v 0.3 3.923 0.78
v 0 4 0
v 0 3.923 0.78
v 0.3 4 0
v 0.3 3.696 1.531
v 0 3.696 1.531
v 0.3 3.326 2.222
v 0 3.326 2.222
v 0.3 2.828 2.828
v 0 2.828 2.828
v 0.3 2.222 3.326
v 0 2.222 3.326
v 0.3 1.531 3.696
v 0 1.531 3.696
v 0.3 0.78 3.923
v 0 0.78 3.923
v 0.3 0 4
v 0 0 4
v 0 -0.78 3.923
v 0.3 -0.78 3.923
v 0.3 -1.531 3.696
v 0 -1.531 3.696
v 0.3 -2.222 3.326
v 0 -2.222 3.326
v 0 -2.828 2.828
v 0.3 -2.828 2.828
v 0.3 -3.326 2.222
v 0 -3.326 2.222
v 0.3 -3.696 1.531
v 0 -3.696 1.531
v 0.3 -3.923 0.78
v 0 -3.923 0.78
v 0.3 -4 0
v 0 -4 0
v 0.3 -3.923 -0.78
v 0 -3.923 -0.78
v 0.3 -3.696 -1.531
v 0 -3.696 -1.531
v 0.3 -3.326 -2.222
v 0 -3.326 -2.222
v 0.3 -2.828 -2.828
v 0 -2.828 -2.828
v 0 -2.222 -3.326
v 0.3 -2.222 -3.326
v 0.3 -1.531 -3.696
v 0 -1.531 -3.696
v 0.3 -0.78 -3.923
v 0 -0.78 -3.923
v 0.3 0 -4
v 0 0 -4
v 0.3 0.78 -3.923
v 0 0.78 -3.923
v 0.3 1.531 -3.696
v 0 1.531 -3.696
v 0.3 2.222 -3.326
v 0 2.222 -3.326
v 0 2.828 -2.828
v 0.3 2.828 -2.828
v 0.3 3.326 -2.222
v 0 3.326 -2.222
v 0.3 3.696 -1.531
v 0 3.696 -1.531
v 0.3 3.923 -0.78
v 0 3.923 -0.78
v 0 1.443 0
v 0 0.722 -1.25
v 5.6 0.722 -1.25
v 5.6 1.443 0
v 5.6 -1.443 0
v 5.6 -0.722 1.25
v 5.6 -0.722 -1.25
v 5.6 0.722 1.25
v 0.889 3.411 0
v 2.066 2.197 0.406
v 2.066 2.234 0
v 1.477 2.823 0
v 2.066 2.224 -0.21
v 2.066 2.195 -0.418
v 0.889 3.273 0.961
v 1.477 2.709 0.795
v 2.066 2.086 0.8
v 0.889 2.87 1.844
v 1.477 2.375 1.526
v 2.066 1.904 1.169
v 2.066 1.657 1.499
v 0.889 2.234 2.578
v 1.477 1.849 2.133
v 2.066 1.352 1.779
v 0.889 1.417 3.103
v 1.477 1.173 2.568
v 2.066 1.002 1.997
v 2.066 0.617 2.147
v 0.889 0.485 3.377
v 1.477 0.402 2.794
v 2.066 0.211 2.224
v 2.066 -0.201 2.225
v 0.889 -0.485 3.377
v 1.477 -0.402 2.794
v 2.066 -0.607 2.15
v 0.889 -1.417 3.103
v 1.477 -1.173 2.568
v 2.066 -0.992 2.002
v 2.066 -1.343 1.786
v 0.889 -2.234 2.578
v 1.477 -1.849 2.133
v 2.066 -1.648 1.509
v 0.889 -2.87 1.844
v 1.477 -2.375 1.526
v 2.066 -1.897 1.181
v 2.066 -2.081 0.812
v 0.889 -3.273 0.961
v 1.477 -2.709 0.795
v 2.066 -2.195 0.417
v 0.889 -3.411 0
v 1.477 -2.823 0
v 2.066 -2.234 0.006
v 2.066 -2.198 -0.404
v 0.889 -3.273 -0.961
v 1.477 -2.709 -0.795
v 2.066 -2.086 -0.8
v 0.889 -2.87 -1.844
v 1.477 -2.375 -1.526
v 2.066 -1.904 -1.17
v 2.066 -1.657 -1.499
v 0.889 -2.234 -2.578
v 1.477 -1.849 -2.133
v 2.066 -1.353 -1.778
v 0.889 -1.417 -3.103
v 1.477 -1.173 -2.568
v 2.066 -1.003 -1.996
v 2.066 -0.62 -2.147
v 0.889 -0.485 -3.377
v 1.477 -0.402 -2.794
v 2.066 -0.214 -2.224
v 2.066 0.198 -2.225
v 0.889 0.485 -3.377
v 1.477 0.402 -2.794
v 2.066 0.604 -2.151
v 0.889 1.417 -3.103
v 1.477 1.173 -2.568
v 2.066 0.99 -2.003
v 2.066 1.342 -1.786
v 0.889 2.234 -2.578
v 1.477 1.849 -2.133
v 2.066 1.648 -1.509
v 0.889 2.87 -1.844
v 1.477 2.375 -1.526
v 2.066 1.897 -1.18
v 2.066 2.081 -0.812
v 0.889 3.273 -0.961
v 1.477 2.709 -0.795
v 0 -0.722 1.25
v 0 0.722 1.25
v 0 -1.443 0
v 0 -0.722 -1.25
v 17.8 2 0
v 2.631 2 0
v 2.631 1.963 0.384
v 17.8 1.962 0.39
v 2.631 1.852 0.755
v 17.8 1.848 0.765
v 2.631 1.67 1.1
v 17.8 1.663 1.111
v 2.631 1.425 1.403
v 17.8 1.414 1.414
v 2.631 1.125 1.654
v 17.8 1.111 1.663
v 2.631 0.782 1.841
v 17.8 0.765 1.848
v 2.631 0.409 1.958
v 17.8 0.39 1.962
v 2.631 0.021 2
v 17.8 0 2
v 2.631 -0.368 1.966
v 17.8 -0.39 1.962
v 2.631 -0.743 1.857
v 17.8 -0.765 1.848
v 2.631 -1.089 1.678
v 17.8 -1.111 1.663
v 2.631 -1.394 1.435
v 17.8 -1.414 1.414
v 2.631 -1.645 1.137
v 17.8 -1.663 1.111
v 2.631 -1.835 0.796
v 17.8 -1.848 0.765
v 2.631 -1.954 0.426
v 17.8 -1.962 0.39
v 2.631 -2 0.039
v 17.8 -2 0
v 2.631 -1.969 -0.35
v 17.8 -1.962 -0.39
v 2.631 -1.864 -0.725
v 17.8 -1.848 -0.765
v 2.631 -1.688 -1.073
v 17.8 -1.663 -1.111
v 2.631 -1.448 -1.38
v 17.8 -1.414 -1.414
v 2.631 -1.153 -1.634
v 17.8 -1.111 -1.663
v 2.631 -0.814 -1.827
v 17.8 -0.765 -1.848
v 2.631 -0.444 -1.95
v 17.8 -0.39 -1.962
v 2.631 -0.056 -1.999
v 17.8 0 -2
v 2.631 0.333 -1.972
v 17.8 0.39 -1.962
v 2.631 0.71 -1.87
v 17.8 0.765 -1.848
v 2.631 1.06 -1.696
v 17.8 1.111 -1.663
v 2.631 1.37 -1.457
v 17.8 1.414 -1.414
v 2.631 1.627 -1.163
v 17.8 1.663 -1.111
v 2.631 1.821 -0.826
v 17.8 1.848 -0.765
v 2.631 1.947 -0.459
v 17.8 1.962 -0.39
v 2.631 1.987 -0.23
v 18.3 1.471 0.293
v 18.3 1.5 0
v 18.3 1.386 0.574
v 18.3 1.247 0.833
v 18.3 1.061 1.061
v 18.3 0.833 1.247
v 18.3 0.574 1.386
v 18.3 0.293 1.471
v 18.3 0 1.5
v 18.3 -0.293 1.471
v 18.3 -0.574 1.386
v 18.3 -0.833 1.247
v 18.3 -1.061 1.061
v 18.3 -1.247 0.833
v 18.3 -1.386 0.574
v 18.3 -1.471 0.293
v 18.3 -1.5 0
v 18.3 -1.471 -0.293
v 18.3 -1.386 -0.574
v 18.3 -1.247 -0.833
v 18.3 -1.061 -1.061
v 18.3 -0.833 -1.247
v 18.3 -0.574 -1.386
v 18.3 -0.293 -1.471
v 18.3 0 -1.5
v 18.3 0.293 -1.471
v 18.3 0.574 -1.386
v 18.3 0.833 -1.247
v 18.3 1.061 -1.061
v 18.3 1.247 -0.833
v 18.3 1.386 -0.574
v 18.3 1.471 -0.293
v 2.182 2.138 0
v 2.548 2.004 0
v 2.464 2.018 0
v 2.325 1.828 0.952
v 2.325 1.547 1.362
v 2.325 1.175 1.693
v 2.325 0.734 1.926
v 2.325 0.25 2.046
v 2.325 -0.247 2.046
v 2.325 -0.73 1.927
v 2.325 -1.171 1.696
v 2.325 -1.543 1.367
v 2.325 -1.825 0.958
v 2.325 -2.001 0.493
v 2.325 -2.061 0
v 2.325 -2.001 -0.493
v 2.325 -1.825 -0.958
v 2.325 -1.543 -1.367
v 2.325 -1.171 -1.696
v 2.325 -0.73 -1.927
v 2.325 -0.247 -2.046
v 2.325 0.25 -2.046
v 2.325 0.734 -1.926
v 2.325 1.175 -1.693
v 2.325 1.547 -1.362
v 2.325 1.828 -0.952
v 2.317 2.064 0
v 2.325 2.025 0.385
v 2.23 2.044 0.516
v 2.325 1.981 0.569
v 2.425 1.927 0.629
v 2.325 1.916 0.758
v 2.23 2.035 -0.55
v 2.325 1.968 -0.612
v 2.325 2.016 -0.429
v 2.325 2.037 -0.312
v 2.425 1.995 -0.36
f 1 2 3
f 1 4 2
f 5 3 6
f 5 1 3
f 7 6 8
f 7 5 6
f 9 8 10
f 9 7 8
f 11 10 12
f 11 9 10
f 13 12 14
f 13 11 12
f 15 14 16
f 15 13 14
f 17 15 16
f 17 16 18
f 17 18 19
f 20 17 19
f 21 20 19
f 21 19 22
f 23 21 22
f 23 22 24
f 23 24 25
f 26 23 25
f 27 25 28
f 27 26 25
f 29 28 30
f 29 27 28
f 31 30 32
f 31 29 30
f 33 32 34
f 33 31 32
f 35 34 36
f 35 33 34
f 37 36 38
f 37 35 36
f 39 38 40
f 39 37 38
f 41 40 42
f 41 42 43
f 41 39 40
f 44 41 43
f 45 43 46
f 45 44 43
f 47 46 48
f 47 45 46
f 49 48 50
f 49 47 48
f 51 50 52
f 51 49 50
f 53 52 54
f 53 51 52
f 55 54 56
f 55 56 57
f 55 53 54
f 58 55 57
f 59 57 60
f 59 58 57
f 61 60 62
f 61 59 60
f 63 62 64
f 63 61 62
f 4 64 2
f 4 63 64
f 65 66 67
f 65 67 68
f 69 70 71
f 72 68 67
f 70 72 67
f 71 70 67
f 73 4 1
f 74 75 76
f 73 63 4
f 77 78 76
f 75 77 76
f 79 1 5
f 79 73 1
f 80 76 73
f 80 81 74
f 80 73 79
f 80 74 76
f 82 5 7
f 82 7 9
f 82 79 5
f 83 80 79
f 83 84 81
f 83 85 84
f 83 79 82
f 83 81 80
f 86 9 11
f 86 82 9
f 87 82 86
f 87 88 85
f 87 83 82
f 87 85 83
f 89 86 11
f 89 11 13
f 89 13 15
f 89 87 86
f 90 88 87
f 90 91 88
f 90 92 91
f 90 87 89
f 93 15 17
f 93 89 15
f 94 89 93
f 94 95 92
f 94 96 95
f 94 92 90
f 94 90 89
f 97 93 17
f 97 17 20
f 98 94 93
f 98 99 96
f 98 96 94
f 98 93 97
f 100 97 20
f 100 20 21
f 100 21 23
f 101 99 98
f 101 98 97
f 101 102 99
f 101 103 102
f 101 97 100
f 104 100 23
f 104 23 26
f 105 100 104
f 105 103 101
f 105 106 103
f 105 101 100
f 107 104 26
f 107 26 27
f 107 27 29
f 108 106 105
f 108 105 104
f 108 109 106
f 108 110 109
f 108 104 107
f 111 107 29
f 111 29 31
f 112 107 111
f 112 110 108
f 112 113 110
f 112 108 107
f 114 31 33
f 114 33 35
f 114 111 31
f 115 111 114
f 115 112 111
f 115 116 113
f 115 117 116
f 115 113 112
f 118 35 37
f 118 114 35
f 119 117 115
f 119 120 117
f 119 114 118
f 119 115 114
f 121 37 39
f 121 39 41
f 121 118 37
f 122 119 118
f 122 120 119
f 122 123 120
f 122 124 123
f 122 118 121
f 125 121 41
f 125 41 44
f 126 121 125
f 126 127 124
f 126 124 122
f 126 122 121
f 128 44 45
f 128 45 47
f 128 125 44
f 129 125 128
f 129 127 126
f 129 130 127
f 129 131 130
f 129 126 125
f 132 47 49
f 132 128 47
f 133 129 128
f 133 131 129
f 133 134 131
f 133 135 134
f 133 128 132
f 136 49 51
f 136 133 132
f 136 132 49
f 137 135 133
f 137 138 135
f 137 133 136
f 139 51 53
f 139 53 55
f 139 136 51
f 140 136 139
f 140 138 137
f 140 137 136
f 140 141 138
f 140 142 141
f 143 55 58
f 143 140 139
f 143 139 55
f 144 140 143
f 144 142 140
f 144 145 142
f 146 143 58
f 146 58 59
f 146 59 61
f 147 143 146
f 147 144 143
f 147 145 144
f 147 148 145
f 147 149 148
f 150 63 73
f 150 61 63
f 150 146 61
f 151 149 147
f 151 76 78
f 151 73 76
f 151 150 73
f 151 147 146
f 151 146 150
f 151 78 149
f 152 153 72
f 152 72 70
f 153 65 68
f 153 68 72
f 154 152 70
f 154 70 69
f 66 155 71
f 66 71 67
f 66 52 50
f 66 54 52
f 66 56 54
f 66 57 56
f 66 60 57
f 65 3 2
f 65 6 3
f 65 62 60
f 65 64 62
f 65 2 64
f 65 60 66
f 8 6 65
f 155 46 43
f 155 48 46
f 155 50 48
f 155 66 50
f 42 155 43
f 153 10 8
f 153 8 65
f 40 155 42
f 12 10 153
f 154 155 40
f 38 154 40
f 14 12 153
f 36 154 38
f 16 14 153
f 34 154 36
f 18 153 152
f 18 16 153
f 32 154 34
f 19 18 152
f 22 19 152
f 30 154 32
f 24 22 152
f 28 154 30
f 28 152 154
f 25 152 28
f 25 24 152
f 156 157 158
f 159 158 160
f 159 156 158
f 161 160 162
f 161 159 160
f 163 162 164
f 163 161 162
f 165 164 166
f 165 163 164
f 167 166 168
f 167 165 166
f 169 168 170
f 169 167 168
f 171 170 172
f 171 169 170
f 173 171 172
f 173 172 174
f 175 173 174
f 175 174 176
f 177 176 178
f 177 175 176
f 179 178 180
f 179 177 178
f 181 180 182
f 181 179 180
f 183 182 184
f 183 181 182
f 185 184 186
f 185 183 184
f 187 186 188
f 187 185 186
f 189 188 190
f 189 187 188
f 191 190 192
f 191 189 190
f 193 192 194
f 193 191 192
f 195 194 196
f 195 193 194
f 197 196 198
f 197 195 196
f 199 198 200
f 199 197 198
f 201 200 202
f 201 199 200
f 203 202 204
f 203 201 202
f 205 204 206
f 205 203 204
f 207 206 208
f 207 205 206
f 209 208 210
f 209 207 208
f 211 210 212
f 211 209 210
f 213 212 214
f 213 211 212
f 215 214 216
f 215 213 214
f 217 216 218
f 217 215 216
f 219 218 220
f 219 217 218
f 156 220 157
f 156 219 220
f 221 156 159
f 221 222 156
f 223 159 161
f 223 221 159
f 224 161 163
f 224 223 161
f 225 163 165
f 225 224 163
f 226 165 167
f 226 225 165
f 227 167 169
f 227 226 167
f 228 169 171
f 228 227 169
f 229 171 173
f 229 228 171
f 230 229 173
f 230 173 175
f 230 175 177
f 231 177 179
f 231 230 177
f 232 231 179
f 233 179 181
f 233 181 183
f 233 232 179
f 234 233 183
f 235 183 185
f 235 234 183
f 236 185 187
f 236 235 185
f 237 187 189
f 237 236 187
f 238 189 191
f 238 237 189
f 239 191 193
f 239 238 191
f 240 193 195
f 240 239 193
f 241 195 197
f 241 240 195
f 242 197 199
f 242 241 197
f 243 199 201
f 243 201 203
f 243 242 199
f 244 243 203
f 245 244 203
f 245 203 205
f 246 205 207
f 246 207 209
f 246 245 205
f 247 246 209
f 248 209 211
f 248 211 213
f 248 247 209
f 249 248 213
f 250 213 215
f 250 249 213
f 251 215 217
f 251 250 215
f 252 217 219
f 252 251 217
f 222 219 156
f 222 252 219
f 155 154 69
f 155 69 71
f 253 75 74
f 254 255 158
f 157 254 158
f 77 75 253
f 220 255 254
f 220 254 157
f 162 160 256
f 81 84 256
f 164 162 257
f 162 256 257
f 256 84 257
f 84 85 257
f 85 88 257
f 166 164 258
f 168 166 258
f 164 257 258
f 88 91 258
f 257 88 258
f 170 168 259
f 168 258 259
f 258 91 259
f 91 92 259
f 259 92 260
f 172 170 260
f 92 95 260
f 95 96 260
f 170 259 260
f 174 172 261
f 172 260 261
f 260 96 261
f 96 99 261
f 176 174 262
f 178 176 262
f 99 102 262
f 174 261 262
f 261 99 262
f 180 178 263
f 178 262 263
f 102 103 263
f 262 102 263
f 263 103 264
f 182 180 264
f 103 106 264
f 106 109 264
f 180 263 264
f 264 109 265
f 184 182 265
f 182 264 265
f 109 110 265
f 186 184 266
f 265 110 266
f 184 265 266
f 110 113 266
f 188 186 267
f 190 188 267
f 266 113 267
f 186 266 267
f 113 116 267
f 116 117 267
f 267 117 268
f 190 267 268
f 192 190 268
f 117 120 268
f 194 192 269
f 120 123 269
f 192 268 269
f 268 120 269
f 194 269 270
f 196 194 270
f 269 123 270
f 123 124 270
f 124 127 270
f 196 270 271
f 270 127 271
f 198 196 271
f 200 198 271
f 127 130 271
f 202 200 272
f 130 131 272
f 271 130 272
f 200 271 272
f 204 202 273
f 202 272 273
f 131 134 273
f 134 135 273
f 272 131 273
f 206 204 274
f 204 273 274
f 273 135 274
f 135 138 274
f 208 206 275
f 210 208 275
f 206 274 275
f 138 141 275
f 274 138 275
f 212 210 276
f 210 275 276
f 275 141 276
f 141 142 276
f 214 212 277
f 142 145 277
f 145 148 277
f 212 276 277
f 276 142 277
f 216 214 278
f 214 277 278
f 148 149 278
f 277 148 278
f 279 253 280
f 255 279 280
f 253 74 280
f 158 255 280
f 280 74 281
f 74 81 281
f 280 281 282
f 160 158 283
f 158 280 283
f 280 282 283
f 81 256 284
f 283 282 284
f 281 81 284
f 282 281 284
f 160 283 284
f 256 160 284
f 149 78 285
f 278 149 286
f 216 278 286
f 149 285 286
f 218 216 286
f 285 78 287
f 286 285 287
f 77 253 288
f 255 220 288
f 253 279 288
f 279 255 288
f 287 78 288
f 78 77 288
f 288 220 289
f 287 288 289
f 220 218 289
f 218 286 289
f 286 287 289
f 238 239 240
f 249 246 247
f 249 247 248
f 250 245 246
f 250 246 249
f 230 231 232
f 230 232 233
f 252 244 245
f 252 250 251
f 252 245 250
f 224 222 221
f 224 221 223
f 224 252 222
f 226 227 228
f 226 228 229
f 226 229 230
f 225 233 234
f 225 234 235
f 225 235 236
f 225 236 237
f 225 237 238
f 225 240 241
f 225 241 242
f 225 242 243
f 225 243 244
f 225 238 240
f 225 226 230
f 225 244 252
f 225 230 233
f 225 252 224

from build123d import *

# Parameters (mm, degrees)
FILLET1_R   = 0.8
HEX_2_DEPTH = 5.6


with BuildPart() as part:
    # BodySke → BaseBody (revolve)
    with BuildSketch(Plane.XY):
        Polygon((0, 0), (0, 4), (0.3, 4), (2.3, 2), (17.8, 2), (18.3, 1.5), (18.3, 0), align=None)
    revolve(axis=Axis((0, 0, 0), (1, 0, 0)))

    # Fillet1
    fillet1_edges = [part.edges().sort_by_distance(p)[0] for p in [
        (2.3, -2, 0),
    ]]
    fillet(fillet1_edges, radius=FILLET1_R)

    # Sketch3 → Hex 2 (cut)
    with BuildSketch(Plane.ZY):
        Polygon((-1.25, -0.721687836), (-1.25, 0.721687836), (0, 1.443375673), (1.25, 0.721687836), (1.25, -0.721687836), (0, -1.443375673), align=None)
    extrude(amount=-HEX_2_DEPTH, mode=Mode.SUBTRACT)


solid = part.part
